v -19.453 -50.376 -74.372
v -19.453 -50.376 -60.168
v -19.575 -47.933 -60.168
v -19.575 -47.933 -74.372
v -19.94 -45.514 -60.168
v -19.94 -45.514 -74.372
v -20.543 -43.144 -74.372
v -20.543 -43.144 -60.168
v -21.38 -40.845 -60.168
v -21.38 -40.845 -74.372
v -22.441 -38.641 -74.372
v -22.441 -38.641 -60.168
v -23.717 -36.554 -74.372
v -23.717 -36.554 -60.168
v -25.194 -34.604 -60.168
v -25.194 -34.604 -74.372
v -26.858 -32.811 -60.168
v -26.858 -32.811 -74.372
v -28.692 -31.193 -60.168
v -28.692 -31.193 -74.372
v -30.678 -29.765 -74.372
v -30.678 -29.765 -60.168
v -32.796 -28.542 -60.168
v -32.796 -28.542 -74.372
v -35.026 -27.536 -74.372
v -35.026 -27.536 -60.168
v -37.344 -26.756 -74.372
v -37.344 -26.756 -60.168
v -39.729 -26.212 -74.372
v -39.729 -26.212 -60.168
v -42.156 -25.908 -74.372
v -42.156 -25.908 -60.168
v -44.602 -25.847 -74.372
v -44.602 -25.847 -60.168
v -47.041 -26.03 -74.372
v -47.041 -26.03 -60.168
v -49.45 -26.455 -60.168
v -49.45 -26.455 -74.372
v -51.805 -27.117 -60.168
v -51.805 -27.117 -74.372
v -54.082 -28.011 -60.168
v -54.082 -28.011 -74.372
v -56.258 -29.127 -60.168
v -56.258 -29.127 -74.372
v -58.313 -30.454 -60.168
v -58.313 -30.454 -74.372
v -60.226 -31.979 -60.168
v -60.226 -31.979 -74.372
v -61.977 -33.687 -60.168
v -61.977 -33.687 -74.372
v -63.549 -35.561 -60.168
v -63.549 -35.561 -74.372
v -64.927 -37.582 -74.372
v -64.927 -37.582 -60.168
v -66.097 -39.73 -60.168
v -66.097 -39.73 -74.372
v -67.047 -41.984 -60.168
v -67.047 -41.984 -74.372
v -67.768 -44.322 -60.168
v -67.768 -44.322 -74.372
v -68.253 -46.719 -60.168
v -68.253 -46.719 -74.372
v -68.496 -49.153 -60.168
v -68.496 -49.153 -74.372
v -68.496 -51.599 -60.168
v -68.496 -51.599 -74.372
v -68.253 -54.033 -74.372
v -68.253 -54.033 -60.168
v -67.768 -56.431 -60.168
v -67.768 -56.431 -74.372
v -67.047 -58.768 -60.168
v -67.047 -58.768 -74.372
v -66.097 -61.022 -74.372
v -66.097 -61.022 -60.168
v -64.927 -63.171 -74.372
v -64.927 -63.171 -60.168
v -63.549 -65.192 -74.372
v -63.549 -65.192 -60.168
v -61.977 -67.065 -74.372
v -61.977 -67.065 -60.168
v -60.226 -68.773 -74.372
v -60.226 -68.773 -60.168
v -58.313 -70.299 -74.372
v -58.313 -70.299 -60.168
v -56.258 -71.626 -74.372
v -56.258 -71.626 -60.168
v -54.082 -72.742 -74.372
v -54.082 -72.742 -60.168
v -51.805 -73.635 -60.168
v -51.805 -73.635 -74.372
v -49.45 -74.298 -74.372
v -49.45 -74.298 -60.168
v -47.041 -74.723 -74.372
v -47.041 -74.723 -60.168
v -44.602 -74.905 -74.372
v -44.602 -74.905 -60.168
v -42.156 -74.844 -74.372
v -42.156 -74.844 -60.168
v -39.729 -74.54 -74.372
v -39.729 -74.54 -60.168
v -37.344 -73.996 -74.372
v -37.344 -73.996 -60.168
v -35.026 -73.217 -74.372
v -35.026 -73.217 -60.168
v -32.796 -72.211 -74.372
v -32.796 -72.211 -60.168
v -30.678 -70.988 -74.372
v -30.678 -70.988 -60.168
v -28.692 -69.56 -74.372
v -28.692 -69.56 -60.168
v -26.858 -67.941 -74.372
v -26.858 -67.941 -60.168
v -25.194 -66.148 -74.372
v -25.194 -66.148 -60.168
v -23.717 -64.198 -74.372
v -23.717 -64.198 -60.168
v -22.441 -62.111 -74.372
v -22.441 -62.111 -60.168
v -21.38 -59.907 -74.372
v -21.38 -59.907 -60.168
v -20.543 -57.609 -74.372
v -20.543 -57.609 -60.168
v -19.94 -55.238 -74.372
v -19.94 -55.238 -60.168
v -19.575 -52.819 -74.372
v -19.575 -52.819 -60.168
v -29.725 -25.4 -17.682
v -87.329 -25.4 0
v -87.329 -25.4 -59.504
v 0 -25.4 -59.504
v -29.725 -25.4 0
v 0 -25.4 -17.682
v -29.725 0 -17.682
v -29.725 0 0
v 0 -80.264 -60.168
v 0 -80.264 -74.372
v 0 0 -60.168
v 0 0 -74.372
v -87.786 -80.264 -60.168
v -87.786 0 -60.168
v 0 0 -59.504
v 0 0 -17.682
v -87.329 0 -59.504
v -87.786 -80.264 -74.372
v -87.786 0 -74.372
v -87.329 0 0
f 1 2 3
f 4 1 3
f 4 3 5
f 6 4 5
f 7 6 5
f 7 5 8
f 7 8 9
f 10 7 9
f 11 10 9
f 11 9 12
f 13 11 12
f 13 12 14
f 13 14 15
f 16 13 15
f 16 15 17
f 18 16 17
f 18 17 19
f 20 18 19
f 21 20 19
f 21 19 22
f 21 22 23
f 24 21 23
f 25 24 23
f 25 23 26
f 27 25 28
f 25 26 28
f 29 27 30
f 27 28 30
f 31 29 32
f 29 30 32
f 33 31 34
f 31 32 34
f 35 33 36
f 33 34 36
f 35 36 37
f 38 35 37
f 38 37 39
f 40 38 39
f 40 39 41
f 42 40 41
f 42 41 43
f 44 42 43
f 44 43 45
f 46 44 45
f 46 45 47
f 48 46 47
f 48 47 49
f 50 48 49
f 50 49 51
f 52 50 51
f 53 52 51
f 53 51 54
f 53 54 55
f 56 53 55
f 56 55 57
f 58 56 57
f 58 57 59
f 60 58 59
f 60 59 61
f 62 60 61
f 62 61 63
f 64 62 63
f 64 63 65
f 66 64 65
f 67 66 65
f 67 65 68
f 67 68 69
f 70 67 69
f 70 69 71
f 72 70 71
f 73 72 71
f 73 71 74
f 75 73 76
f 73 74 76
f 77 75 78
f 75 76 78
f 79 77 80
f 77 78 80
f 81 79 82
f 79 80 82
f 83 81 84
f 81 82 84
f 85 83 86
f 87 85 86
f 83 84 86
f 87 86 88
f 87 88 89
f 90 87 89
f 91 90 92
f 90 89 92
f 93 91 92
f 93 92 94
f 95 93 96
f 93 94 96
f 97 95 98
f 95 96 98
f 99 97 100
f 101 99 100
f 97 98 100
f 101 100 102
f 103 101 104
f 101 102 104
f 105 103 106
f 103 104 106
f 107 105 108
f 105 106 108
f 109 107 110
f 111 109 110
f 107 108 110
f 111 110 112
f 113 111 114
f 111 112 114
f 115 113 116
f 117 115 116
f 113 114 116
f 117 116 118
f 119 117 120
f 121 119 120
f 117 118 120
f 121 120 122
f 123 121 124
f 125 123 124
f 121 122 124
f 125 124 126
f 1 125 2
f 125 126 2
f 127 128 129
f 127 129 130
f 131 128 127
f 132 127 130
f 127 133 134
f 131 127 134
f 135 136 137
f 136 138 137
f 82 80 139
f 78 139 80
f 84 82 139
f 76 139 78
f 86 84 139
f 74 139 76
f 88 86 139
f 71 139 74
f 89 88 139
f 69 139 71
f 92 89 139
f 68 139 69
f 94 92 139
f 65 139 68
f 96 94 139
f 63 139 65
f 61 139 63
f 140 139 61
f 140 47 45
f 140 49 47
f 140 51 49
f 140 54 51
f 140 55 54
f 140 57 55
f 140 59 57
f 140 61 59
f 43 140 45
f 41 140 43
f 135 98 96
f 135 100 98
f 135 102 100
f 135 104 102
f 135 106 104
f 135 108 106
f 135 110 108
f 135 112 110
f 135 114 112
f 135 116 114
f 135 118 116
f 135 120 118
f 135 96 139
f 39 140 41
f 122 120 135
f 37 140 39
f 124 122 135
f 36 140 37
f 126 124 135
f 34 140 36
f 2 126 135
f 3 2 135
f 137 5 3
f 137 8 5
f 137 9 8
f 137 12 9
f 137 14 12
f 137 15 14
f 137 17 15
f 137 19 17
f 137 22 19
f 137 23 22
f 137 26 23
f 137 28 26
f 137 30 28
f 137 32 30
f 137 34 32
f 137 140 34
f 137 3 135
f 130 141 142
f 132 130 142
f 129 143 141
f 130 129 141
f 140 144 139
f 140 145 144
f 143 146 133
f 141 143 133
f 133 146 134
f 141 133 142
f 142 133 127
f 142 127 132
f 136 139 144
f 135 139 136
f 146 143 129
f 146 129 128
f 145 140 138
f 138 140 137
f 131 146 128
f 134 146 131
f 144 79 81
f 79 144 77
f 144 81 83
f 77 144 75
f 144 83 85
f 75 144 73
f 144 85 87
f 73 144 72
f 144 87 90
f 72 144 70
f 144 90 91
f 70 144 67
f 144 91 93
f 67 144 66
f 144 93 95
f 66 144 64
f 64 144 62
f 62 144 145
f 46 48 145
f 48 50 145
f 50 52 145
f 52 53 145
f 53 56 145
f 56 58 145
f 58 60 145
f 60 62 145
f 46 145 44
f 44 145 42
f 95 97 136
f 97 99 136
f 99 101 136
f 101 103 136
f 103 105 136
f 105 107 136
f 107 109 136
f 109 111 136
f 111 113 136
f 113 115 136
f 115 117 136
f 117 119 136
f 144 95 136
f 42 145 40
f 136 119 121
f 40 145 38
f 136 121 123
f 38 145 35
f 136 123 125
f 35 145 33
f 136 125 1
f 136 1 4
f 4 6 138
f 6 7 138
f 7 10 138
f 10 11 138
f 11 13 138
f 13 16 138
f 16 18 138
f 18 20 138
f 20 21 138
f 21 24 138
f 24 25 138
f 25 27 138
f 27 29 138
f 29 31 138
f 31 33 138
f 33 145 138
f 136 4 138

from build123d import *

# Parameters (mm, degrees)
F0_W     = 87.3286351562
F0_H     = 59.5039390028
F1_DEPTH = 25.4
F2_W     = 29.7251585871
F2_H     = 17.6822375506
F3_DEPTH = 25.401
F4_W     = 87.786115706
F4_H     = 14.2035968602
F5_DEPTH = 25.4
F6_DEPTH = 54.864
F7_R     = 24.5367923139
F8_DEPTH = 74.3726135621


with BuildPart() as f1:
    # F0 (on Front) → F1 (new body)
    with BuildSketch(Plane.XZ):
        with Locations((-43.6643175781, -29.7519695014)):
            Rectangle(F0_W, F0_H)
    extrude(amount=F1_DEPTH)

    # F2 (on Front) → F3 (cut, through all)
    with BuildSketch(Plane.XZ):
        with Locations((-14.8625792935, -8.8411187753)):
            Rectangle(F2_W, F2_H)
    extrude(amount=F3_DEPTH, mode=Mode.SUBTRACT)


with BuildPart() as f5:
    # F4 (on Front) → F5 (new body)
    with BuildSketch(Plane.XZ):
        with Locations((-43.893057853, -67.269815132)):
            Rectangle(F4_W, F4_H)
    extrude(amount=F5_DEPTH)

    # F6 (add): a face of the model
    f6_faces = [f5.faces().sort_by_distance(p)[0] for p in [
        (-43.893057853, -25.4, -67.269815132),
    ]]
    extrude(f6_faces, amount=F6_DEPTH)

    # F7 (on Top) → F8 (cut, through all)
    with BuildSketch(Plane.XY):
        with Locations((-43.99003461, -50.3762103617)):
            Circle(F7_R)
    extrude(amount=-F8_DEPTH, mode=Mode.SUBTRACT)


solid = Compound([f1.part, f5.part])
